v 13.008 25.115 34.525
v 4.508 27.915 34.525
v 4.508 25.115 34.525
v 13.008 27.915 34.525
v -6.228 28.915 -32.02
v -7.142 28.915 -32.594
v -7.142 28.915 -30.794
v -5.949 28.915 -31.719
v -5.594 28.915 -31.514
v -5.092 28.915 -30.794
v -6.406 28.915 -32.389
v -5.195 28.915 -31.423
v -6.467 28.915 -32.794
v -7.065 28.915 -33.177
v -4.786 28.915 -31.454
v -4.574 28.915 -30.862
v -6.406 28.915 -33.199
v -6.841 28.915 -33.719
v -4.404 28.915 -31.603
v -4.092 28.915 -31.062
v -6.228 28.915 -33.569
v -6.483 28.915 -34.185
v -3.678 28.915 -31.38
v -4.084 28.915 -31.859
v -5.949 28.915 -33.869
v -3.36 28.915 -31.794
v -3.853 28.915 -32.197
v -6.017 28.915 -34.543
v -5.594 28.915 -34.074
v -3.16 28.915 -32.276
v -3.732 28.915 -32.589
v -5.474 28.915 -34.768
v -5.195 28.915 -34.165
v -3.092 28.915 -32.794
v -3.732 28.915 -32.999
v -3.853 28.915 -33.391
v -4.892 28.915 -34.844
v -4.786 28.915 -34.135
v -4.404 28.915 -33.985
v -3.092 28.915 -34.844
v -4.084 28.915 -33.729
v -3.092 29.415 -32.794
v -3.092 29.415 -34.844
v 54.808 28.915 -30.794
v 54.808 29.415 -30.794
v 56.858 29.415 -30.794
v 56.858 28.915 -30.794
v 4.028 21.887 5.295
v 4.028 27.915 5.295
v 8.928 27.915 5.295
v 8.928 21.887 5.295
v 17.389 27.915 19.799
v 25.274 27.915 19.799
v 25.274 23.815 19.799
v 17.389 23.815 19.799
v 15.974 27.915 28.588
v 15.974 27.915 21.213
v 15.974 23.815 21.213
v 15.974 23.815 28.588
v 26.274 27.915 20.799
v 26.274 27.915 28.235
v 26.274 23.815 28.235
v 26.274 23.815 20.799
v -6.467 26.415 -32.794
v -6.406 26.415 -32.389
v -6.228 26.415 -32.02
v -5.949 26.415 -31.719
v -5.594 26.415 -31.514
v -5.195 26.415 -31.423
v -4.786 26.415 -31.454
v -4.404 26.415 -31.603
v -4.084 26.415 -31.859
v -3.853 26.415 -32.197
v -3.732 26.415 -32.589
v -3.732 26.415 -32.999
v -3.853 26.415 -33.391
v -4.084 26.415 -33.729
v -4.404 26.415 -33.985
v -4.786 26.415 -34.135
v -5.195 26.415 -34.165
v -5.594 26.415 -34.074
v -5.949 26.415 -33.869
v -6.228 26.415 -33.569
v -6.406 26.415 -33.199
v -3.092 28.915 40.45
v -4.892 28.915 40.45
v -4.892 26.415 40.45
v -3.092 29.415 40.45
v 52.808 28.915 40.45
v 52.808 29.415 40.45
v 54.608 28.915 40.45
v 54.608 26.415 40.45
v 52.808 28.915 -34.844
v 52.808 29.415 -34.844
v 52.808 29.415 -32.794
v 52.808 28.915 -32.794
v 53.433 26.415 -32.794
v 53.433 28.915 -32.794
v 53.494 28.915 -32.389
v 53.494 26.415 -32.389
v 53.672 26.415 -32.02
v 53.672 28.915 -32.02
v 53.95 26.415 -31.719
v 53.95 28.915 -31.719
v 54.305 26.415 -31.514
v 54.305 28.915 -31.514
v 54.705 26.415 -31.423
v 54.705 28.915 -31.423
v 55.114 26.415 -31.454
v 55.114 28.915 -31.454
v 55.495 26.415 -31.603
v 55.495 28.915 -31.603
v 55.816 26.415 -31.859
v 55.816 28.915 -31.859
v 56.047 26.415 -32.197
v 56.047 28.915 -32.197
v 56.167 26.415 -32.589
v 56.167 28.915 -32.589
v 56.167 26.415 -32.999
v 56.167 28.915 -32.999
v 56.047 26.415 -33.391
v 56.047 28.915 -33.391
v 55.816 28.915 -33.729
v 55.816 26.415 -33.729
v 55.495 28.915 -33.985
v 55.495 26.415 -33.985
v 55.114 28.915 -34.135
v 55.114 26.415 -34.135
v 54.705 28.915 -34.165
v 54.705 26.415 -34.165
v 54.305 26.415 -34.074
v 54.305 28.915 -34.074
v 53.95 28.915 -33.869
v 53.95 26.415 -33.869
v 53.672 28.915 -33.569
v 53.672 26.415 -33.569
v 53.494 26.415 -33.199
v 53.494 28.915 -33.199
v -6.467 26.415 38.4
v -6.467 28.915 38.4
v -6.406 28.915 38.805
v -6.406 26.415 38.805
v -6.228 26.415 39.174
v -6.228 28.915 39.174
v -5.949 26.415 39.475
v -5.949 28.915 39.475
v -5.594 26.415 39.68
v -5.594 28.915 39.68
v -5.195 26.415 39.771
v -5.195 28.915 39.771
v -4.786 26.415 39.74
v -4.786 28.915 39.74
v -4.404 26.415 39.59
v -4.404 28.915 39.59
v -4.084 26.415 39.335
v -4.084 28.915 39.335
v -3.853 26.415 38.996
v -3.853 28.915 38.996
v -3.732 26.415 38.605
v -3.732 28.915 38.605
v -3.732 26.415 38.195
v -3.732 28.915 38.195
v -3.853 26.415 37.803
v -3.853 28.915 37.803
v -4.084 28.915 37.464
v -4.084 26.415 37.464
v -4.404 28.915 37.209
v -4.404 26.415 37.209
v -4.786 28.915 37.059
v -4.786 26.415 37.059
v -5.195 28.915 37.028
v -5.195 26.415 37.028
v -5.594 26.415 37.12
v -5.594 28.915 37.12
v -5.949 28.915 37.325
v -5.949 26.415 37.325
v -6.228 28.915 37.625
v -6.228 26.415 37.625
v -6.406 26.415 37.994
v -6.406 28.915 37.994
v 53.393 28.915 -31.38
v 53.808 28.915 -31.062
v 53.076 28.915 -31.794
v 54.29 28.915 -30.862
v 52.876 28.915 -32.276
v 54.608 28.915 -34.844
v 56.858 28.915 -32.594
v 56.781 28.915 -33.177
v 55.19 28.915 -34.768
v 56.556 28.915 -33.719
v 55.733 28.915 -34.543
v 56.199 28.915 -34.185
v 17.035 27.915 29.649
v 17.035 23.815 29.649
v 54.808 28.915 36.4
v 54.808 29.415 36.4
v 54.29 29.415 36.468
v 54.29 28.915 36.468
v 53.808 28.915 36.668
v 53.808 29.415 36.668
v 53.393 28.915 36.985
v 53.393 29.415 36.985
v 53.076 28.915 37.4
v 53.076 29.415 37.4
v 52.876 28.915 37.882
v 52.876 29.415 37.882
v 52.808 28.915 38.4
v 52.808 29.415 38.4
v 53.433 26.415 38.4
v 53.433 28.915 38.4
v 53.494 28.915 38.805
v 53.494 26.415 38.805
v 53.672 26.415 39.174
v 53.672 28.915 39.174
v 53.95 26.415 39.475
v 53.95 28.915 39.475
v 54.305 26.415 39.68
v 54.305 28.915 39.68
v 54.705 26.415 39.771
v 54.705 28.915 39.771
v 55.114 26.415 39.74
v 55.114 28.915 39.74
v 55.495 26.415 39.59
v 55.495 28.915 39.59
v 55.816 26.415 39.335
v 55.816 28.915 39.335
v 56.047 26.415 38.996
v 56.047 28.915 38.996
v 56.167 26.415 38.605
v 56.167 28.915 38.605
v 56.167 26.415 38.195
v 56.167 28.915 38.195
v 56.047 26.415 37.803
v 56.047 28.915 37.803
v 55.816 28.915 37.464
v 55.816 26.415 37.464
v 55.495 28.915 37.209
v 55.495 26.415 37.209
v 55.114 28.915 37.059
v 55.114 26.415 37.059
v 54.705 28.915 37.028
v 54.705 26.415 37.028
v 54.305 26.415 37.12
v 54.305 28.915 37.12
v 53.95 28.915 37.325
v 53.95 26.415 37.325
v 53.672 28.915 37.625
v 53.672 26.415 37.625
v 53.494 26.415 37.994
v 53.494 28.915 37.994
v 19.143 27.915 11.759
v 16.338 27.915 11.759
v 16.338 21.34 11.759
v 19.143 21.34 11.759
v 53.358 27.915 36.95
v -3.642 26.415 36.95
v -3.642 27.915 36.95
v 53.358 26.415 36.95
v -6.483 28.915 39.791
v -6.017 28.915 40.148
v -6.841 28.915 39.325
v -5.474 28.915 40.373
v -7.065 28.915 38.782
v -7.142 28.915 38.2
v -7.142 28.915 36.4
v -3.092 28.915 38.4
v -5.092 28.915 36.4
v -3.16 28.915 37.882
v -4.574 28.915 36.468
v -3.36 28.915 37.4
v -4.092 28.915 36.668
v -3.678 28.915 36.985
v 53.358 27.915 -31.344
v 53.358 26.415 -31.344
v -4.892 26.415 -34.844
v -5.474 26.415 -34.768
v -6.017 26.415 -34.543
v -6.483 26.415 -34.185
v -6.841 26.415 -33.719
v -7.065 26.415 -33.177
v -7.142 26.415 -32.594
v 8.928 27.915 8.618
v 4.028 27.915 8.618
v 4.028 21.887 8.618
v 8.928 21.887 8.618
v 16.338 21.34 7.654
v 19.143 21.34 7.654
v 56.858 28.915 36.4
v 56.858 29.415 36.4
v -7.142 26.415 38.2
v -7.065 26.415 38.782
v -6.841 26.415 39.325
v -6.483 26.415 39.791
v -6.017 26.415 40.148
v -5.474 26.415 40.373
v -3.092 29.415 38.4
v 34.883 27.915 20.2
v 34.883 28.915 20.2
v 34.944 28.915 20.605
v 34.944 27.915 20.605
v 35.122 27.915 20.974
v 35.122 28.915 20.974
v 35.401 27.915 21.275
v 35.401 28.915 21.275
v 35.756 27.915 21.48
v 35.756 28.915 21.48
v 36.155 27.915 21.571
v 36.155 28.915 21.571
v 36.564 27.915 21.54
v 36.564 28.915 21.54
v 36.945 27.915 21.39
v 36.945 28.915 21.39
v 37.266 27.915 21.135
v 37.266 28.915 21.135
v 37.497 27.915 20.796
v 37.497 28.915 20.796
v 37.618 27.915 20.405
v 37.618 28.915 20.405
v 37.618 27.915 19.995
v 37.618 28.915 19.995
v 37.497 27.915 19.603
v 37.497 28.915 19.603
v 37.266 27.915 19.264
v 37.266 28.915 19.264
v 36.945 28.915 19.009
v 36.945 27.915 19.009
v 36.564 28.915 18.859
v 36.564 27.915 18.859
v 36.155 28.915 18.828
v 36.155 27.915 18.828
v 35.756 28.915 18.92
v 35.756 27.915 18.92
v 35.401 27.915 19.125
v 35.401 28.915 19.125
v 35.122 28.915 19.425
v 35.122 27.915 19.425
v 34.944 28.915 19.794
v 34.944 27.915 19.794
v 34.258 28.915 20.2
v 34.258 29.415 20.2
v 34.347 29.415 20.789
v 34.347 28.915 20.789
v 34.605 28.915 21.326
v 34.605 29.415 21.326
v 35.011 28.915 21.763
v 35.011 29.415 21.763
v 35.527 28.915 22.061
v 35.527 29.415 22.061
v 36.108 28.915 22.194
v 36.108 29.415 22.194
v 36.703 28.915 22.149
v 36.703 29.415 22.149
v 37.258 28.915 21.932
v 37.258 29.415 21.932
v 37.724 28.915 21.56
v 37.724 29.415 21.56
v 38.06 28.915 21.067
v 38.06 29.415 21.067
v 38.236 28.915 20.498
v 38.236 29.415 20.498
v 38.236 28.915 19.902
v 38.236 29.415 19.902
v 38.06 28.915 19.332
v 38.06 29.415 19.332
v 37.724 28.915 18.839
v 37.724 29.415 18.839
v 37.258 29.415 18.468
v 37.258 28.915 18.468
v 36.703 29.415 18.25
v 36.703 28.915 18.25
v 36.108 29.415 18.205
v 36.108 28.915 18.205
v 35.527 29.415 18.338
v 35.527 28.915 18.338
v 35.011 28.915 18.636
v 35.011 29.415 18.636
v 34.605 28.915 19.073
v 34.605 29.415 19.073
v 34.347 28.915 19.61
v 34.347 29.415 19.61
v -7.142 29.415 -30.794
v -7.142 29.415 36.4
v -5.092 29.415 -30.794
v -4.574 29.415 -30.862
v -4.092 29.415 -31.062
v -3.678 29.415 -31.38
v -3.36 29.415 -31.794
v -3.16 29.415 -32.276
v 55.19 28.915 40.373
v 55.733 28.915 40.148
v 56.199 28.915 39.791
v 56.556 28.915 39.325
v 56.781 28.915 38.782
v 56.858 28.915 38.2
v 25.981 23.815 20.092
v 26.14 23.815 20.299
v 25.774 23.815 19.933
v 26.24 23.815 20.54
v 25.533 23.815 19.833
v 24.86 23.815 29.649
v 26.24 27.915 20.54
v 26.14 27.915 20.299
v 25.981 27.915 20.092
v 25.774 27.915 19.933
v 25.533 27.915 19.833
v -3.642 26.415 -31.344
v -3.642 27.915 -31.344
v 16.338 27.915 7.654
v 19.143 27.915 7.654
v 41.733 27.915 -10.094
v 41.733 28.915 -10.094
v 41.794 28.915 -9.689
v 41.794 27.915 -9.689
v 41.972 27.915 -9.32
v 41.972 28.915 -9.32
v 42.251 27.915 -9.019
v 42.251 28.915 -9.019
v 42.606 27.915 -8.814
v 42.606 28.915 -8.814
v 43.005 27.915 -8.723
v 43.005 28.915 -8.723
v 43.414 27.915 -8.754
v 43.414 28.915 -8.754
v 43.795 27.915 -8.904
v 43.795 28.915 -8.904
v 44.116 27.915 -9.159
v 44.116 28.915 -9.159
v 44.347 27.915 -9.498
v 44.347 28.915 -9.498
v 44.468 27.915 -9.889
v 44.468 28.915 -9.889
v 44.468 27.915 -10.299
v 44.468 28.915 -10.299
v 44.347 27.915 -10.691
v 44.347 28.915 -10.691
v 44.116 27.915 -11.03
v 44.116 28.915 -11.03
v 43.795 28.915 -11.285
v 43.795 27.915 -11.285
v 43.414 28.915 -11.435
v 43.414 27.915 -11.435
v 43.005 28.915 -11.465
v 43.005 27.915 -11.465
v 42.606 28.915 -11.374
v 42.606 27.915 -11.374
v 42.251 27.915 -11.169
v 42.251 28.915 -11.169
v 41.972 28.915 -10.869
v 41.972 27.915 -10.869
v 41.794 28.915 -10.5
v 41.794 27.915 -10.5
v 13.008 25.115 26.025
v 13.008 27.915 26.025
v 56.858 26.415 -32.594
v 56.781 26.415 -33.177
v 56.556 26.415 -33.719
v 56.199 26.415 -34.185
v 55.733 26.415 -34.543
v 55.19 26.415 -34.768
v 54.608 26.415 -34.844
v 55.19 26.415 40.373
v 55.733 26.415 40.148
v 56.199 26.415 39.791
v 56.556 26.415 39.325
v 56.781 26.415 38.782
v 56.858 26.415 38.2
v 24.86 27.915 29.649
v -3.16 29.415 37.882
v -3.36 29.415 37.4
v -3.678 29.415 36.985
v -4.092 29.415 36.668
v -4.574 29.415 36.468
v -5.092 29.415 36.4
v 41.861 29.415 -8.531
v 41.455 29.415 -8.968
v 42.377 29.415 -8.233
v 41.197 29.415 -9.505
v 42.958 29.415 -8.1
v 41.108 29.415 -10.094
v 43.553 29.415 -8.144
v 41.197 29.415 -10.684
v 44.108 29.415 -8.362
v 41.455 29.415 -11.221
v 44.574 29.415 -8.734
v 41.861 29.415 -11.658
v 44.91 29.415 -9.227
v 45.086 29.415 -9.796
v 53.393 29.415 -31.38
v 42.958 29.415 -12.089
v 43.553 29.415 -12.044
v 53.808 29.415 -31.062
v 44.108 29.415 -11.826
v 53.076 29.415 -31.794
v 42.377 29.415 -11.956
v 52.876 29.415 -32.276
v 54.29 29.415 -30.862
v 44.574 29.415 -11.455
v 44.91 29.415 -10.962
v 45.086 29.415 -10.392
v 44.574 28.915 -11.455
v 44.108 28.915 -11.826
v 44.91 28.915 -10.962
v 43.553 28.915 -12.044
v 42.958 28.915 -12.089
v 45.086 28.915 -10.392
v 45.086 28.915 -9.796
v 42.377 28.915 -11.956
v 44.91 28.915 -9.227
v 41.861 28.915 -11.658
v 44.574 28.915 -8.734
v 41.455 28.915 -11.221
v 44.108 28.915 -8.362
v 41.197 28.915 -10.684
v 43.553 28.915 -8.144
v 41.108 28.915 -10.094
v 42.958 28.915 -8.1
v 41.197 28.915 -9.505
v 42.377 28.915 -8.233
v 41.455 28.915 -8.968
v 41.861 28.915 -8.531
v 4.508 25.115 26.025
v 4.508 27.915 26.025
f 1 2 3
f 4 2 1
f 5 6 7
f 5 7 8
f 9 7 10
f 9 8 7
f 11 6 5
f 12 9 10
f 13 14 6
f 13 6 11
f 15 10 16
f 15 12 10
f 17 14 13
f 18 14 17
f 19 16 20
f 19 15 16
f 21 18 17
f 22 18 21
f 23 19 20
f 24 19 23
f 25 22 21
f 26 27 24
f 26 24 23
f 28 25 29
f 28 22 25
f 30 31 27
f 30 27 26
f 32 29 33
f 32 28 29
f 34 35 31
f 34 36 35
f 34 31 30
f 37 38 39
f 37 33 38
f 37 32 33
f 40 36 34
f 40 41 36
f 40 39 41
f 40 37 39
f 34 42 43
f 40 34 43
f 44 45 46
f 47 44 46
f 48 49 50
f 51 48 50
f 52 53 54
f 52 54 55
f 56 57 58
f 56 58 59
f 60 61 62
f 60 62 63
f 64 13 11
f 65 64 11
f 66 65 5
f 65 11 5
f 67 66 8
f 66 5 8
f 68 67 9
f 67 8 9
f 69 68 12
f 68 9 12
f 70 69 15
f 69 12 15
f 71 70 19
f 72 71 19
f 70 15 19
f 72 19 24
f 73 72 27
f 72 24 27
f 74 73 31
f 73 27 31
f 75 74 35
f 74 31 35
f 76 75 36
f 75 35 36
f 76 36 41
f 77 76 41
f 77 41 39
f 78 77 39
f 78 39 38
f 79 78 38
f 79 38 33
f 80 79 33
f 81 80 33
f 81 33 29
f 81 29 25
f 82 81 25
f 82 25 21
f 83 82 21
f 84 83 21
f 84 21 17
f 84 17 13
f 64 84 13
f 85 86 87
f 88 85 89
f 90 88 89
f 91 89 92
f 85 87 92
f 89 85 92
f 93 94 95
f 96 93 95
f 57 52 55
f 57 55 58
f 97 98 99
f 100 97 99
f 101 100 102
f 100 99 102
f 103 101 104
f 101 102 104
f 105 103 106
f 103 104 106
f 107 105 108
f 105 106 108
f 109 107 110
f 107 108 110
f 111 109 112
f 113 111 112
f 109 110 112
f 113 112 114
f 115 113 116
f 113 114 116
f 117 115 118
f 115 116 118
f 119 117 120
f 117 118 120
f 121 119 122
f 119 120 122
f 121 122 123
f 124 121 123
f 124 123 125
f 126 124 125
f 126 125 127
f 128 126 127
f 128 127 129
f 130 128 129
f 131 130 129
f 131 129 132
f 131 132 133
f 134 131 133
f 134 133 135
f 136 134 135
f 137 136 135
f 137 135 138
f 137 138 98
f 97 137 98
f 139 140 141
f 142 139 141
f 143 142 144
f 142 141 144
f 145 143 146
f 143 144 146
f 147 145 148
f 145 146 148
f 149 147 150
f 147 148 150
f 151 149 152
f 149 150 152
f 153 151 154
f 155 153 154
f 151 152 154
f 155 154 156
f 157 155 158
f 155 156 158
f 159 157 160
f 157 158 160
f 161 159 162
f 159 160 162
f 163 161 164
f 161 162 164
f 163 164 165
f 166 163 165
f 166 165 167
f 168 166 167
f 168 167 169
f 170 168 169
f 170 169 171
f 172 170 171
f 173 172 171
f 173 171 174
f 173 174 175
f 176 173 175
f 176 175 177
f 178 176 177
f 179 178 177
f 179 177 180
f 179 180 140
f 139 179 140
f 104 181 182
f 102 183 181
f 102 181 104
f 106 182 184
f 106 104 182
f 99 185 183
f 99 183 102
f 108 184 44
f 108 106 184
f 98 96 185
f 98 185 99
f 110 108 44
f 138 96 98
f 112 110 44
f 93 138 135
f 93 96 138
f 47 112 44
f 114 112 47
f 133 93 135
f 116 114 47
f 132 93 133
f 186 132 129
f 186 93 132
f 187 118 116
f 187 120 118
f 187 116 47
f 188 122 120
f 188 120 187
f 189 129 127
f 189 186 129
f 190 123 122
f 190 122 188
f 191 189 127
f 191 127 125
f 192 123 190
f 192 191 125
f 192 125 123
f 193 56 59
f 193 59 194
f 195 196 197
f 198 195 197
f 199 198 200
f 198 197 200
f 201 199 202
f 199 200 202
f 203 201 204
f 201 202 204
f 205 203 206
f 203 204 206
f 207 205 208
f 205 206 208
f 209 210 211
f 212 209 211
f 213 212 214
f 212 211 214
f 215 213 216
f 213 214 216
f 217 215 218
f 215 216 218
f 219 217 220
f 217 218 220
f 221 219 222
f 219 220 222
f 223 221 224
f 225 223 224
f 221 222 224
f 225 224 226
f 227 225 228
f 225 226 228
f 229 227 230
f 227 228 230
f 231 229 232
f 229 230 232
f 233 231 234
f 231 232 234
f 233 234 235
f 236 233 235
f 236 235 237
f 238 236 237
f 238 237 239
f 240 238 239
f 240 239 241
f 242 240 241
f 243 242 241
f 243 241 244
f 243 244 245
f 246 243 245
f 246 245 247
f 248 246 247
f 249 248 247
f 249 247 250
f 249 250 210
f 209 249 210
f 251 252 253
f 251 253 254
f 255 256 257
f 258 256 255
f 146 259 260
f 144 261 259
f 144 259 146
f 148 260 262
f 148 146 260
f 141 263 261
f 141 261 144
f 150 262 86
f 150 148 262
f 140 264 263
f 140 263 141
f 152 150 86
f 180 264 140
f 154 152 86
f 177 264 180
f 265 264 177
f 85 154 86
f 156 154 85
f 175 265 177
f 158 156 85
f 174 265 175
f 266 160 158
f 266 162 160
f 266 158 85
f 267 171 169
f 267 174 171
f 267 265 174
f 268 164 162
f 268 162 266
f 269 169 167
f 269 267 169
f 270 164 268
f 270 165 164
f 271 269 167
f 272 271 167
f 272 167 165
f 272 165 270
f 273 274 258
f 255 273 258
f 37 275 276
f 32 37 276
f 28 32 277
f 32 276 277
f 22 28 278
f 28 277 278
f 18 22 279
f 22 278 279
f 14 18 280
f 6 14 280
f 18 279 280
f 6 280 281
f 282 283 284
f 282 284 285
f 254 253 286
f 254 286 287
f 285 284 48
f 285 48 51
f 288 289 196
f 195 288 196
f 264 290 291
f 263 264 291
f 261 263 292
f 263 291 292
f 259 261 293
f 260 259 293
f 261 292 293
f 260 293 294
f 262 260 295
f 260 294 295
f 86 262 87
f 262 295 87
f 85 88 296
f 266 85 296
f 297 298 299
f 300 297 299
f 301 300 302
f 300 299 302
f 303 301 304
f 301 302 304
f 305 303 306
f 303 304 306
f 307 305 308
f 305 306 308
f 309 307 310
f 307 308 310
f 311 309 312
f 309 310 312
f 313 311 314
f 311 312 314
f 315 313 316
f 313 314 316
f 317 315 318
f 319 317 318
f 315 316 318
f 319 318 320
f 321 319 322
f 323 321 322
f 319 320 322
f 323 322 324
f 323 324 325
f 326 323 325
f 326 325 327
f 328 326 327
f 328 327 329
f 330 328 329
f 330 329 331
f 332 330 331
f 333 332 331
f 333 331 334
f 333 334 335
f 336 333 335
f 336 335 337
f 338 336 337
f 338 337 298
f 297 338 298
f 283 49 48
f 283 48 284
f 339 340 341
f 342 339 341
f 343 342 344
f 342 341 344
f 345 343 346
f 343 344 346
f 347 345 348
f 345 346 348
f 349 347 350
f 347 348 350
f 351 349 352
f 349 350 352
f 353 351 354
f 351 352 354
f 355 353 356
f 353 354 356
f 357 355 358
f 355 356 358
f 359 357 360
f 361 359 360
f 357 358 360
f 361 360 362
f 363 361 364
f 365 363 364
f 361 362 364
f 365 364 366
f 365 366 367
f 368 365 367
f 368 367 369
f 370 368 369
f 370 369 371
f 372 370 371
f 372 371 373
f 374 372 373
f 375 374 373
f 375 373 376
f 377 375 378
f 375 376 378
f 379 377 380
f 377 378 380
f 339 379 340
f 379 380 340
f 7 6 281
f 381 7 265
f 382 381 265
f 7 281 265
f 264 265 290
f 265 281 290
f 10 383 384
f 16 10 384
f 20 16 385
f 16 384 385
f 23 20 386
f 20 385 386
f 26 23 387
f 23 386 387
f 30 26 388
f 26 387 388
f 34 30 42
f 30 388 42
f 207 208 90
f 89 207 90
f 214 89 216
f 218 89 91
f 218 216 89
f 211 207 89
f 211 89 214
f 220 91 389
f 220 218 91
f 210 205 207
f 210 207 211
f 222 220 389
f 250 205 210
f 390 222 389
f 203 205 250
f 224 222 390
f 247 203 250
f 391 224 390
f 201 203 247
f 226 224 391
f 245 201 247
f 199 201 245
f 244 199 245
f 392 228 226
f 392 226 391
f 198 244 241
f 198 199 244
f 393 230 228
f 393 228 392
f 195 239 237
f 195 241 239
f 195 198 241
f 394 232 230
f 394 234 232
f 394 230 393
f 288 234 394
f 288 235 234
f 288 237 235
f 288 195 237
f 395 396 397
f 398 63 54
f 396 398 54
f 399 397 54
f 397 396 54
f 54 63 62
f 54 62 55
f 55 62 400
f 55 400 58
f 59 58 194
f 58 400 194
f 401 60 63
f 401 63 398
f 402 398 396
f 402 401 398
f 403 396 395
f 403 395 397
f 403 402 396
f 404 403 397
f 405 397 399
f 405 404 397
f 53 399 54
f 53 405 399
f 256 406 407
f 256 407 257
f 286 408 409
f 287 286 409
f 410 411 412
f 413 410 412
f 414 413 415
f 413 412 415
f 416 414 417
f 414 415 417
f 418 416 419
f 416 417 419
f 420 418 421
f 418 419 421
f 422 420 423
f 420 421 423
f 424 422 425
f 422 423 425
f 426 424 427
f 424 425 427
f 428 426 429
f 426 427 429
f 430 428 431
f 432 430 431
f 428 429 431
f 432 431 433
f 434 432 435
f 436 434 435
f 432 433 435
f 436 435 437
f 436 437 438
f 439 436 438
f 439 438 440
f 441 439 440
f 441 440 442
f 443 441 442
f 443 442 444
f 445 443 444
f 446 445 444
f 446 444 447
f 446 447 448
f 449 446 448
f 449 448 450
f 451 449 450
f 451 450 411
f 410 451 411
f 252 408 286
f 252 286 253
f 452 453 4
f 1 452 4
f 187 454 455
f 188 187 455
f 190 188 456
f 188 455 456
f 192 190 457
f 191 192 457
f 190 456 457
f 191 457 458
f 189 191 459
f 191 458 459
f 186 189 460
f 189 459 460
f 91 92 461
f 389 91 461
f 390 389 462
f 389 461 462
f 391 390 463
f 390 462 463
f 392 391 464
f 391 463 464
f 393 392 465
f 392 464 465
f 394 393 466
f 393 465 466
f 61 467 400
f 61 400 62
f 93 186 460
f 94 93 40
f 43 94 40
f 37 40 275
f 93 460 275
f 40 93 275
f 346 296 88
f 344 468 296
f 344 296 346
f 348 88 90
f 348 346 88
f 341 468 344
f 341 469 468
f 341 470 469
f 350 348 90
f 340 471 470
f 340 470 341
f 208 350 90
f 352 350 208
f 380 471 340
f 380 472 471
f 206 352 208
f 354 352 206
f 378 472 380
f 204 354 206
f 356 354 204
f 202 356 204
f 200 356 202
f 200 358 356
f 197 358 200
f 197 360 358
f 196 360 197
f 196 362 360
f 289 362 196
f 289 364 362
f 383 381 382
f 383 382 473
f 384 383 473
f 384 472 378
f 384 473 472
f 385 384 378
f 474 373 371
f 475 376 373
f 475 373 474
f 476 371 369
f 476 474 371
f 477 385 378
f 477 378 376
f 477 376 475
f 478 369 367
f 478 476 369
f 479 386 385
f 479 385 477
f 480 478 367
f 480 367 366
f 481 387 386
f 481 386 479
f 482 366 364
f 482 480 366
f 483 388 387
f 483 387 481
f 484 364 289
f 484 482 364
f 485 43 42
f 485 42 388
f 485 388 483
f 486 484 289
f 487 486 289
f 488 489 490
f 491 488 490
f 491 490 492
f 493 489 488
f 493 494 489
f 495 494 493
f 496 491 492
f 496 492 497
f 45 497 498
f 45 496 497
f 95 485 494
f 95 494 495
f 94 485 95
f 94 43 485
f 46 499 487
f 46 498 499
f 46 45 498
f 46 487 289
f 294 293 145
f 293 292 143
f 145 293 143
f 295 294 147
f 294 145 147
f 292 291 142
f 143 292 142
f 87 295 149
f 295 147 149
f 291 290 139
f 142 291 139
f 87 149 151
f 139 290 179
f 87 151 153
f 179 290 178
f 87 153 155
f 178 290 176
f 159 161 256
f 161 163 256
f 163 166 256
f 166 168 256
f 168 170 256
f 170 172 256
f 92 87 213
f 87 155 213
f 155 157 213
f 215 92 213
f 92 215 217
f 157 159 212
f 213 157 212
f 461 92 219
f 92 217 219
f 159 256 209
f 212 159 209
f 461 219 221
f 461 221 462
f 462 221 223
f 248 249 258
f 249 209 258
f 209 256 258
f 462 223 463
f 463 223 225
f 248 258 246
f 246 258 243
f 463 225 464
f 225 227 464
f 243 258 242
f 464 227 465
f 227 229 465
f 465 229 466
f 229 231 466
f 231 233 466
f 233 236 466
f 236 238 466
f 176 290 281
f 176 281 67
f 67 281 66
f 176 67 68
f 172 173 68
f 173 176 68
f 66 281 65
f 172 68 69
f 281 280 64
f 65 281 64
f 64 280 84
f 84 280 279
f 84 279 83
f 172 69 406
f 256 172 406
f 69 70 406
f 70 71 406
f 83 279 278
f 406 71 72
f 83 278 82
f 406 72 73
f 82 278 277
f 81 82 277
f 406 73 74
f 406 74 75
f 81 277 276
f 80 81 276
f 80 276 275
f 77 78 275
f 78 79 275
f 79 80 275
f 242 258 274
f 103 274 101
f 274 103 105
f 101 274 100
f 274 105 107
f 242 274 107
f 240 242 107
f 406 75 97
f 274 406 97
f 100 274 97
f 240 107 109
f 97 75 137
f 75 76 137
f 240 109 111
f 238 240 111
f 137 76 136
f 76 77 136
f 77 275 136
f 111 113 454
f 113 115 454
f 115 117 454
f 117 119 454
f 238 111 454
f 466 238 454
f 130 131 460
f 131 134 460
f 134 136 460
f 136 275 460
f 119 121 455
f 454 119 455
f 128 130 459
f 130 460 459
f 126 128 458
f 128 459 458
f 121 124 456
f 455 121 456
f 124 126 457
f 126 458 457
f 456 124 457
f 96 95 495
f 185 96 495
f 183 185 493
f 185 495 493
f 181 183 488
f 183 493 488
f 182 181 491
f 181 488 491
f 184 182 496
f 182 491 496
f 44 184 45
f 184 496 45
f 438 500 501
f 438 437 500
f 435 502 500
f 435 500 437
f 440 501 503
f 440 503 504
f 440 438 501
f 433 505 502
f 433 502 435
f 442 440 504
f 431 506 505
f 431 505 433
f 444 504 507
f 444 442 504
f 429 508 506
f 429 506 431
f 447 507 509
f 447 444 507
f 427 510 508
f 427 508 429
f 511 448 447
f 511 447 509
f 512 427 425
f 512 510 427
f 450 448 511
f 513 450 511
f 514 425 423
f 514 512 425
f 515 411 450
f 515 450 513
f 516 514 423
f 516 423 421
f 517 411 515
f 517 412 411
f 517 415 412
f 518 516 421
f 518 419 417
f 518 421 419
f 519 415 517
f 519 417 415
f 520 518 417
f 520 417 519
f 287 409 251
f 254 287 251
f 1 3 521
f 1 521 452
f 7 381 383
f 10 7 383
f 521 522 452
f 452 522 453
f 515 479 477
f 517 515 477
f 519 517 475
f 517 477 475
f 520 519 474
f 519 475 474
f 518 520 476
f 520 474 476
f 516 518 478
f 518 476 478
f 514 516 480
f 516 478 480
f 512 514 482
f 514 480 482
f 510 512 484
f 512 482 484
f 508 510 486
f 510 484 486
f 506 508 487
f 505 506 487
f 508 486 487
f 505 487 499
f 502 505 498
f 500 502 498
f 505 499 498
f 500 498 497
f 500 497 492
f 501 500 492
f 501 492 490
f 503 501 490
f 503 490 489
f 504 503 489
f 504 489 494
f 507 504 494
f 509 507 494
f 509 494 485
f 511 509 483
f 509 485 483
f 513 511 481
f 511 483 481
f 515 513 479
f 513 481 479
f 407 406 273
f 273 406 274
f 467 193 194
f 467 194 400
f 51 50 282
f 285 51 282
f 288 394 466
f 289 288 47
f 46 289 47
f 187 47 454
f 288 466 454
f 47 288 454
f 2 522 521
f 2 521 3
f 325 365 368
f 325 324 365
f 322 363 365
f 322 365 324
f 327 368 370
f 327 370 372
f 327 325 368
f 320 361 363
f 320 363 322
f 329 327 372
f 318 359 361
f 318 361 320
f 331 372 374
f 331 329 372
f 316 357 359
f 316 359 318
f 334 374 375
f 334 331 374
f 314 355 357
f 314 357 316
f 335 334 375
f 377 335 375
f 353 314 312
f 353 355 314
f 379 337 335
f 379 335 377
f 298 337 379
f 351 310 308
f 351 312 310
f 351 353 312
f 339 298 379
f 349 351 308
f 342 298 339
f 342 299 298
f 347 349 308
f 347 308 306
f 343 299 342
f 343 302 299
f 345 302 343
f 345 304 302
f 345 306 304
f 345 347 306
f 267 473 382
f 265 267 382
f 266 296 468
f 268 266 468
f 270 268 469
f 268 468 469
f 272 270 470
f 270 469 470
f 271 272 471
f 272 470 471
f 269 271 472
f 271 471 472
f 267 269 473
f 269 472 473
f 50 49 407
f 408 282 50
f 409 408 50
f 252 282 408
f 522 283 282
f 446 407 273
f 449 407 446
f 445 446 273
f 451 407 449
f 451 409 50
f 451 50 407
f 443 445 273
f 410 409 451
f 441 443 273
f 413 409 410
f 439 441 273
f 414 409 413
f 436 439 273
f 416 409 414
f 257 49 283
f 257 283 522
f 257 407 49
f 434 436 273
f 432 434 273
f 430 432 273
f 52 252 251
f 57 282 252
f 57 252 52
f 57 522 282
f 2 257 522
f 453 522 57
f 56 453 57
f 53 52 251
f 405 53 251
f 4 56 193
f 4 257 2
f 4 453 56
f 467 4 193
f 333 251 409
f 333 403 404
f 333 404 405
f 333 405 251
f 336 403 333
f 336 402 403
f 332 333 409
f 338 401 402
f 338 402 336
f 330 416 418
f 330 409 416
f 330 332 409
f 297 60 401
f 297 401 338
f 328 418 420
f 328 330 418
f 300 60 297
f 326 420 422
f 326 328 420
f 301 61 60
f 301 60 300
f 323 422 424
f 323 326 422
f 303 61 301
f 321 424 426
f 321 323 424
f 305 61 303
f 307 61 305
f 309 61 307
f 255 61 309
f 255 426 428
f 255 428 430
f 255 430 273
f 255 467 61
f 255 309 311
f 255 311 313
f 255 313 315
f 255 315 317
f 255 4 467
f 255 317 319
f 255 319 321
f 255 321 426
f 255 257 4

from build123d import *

# Parameters (mm, degrees)
BASE_DEPTH          = 3
SKETCH2_W           = 57
SKETCH2_H           = 68.2942
SHELL_DEPTH         = 1.5
SKETCH3_R           = 1.375
THROUGH_HOLES_DEPTH = 70.842801106
SKETCH6_R           = 1.375
SKETCH6_R_2         = 2
SOCKET_HOLES_DEPTH  = 0.5
SKETCH7_W           = 8.5
SKETCH7_H           = 8.5
BOSS_EXTRUDE2_DEPTH = 2.8
BOSS_EXTRUDE3_DEPTH = 4.1
SKETCH9_W           = 4.9
SKETCH9_H           = 3.32367647
BOSS_EXTRUDE4_DEPTH = 6.028194003
SKETCH10_W          = 2.805255888
SKETCH10_H          = 4.105255888
BOSS_EXTRUDE5_DEPTH = 6.5752


with BuildPart() as part:
    # Sketch1 → Base (new body)
    with BuildSketch(Plane(origin=(0, 26.414945084, 0), x_dir=(1, 0, 0), z_dir=(0, 1, 0))):
        with BuildLine():
            Line((-4.892059596, -40.449863775), (54.607940404, -40.449863775))
            ThreePointArc((54.607940404, -40.449863775), (56.198930662, -39.790854032), (56.857940404, -38.199863775))
            Line((56.857940404, -38.199863775), (56.857940404, 32.594336225))
            ThreePointArc((56.857940404, 32.594336225), (56.198930662, 34.185326483), (54.607940404, 34.844336225))
            Line((54.607940404, 34.844336225), (-4.892059596, 34.844336225))
            ThreePointArc((-4.892059596, 34.844336225), (-6.483049854, 34.185326483), (-7.142059596, 32.594336225))
            Line((-7.142059596, 32.594336225), (-7.142059596, -38.199863775))
            ThreePointArc((-7.142059596, -38.199863775), (-6.483049854, -39.790854032), (-4.892059596, -40.449863775))
        make_face()
    extrude(amount=BASE_DEPTH)

    # Sketch2 → Shell (cut)
    with BuildSketch(Plane.XZ.offset(-26.414945084)):
        with Locations((24.857940404, 2.802763775)):
            Rectangle(SKETCH2_W, SKETCH2_H)
    extrude(amount=-SHELL_DEPTH, mode=Mode.SUBTRACT)

    # Sketch3 → Through Holes (cut, through all)
    with BuildSketch(Plane(origin=(0, 29.414945084, 0), x_dir=(1, 0, 0), z_dir=(0, 1, 0))):
        with Locations(Location((-5.091807064, 32.794083694, 0), (0, 0, 180))):
            Circle(SKETCH3_R)
        with Locations(Location((54.807687872, 32.794083694, 0), (0, 0, 180))):
            Circle(SKETCH3_R)
        with Locations(Location((43.107940404, 10.094336225, 0), (0, 0, 180))):
            Circle(SKETCH3_R)
        with Locations(Location((36.257940404, -20.199611243, 0), (0, 0, 180))):
            Circle(SKETCH3_R)
        with Locations(Location((54.807687872, -38.399611243, 0), (0, 0, 180))):
            Circle(SKETCH3_R)
        with Locations(Location((-5.091807064, -38.399611243, 0), (0, 0, 180))):
            Circle(SKETCH3_R)
    extrude(amount=-THROUGH_HOLES_DEPTH, mode=Mode.SUBTRACT)

    # Sketch6 → Socket Holes (cut)
    # profile 1 of 6: a face of its own
    with BuildSketch(Plane(origin=(0, 29.414945084, 0), x_dir=(1, 0, 0), z_dir=(0, 1, 0))):
        with BuildLine():
            ThreePointArc((-7.142059596, -38.199863775), (-6.483049854, -39.790854032), (-4.892059596, -40.449863775))
            Line((-4.892059596, -40.449863775), (-3.091807064, -40.449863775))
            Line((-3.091807064, -40.449863775), (-3.091807064, -38.399611243))
            ThreePointArc((-3.091807064, -38.399611243), (-3.677593502, -36.98539768), (-5.091807064, -36.399611243))
            Line((-5.091807064, -36.399611243), (-7.142059596, -36.399611243))
            Line((-7.142059596, -36.399611243), (-7.142059596, -38.199863775))
        make_face()
        with Locations(Location((-5.091807064, -38.399611243, 0), (0, 0, 180))):
            Circle(SKETCH6_R, mode=Mode.SUBTRACT)
    # profile 2 of 6: a face of its own
    with BuildSketch(Plane(origin=(0, 29.414945084, 0), x_dir=(1, 0, 0), z_dir=(0, 1, 0))):
        with Locations(Location((36.257940404, -20.199611243, 0), (0, 0, 180))):
            Circle(SKETCH6_R_2)
        with Locations(Location((36.257940404, -20.199611243, 0), (0, 0, 180))):
            Circle(SKETCH6_R, mode=Mode.SUBTRACT)
    # profile 3 of 6: a face of its own
    with BuildSketch(Plane(origin=(0, 29.414945084, 0), x_dir=(1, 0, 0), z_dir=(0, 1, 0))):
        with BuildLine():
            Line((52.807687872, -38.399611243), (52.807687872, -40.449863775))
            Line((52.807687872, -40.449863775), (54.607940404, -40.449863775))
            ThreePointArc((54.607940404, -40.449863775), (56.198930662, -39.790854032), (56.857940404, -38.199863775))
            Line((56.857940404, -38.199863775), (56.857940404, -36.399611243))
            Line((56.857940404, -36.399611243), (54.807687872, -36.399611243))
            ThreePointArc((54.807687872, -36.399611243), (53.39347431, -36.98539768), (52.807687872, -38.399611243))
        make_face()
        with Locations(Location((54.807687872, -38.399611243, 0), (0, 0, 180))):
            Circle(SKETCH6_R, mode=Mode.SUBTRACT)
    # profile 4 of 6: a face of its own
    with BuildSketch(Plane(origin=(0, 29.414945084, 0), x_dir=(1, 0, 0), z_dir=(0, 1, 0))):
        with Locations(Location((43.107940404, 10.094336225, 0), (0, 0, 180))):
            Circle(SKETCH6_R_2)
        with Locations(Location((43.107940404, 10.094336225, 0), (0, 0, 180))):
            Circle(SKETCH6_R, mode=Mode.SUBTRACT)
    # profile 5 of 6: a face of its own
    with BuildSketch(Plane(origin=(0, 29.414945084, 0), x_dir=(1, 0, 0), z_dir=(0, 1, 0))):
        with BuildLine():
            Line((54.807687872, 30.794083694), (56.857940404, 30.794083694))
            Line((56.857940404, 30.794083694), (56.857940404, 32.594336225))
            ThreePointArc((56.857940404, 32.594336225), (56.198930662, 34.185326483), (54.607940404, 34.844336225))
            Line((54.607940404, 34.844336225), (52.807687872, 34.844336225))
            Line((52.807687872, 34.844336225), (52.807687872, 32.794083694))
            ThreePointArc((52.807687872, 32.794083694), (53.39347431, 31.379870131), (54.807687872, 30.794083694))
        make_face()
        with Locations(Location((54.807687872, 32.794083694, 0), (0, 0, 180))):
            Circle(SKETCH6_R, mode=Mode.SUBTRACT)
    # profile 6 of 6: a face of its own
    with BuildSketch(Plane(origin=(0, 29.414945084, 0), x_dir=(1, 0, 0), z_dir=(0, 1, 0))):
        with BuildLine():
            Line((-7.142059596, 32.594336225), (-7.142059596, 30.794083694))
            Line((-7.142059596, 30.794083694), (-5.091807064, 30.794083694))
            ThreePointArc((-5.091807064, 30.794083694), (-3.677593502, 31.379870131), (-3.091807064, 32.794083694))
            Line((-3.091807064, 32.794083694), (-3.091807064, 34.844336225))
            Line((-3.091807064, 34.844336225), (-4.892059596, 34.844336225))
            ThreePointArc((-4.892059596, 34.844336225), (-6.483049854, 34.185326483), (-7.142059596, 32.594336225))
        make_face()
        with Locations(Location((-5.091807064, 32.794083694, 0), (0, 0, 180))):
            Circle(SKETCH6_R, mode=Mode.SUBTRACT)
    extrude(amount=-SOCKET_HOLES_DEPTH, mode=Mode.SUBTRACT)

    # Sketch7 → Boss-Extrude2 (add)
    with BuildSketch(Plane.XZ.offset(-27.914945084)):
        with Locations((8.757575778, 30.275109563)):
            Rectangle(SKETCH7_W, SKETCH7_H)
    extrude(amount=BOSS_EXTRUDE2_DEPTH)

    # Sketch8 → Boss-Extrude3 (add)
    with BuildSketch(Plane.XZ.offset(-27.914945084)):
        with BuildLine():
            Line((26.274319641, 23.450802906), (26.274319641, 20.79902621))
            ThreePointArc((26.274319641, 20.79902621), (25.981426422, 20.091919429), (25.274319641, 19.79902621))
            Line((25.274319641, 19.79902621), (17.388533203, 19.79902621))
            Line((17.388533203, 19.79902621), (15.974319641, 21.213239773))
            Line((15.974319641, 21.213239773), (15.974319641, 23.450802906))
            Line((15.974319641, 23.450802906), (15.974319641, 26.350802906))
            Line((15.974319641, 26.350802906), (15.974319641, 28.588366038))
            Line((15.974319641, 28.588366038), (17.034979813, 29.64902621))
            Line((17.034979813, 29.64902621), (24.860106079, 29.64902621))
            Line((24.860106079, 29.64902621), (26.274319641, 28.234812648))
            Line((26.274319641, 28.234812648), (26.274319641, 26.350802906))
            Line((26.274319641, 26.350802906), (26.274319641, 23.450802906))
        make_face()
    extrude(amount=BOSS_EXTRUDE3_DEPTH)

    # Sketch9 → Boss-Extrude4 (add)
    with BuildSketch(Plane.XZ.offset(-27.914945084)):
        with Locations((6.478182604, 6.956579663)):
            Rectangle(SKETCH9_W, SKETCH9_H)
    extrude(amount=BOSS_EXTRUDE4_DEPTH)

    # Sketch10 → Boss-Extrude5 (add)
    with BuildSketch(Plane.XZ.offset(-27.914945084)):
        with Locations((17.740823979, 9.706286862)):
            Rectangle(SKETCH10_W, SKETCH10_H)
    extrude(amount=BOSS_EXTRUDE5_DEPTH)


solid = part.part
